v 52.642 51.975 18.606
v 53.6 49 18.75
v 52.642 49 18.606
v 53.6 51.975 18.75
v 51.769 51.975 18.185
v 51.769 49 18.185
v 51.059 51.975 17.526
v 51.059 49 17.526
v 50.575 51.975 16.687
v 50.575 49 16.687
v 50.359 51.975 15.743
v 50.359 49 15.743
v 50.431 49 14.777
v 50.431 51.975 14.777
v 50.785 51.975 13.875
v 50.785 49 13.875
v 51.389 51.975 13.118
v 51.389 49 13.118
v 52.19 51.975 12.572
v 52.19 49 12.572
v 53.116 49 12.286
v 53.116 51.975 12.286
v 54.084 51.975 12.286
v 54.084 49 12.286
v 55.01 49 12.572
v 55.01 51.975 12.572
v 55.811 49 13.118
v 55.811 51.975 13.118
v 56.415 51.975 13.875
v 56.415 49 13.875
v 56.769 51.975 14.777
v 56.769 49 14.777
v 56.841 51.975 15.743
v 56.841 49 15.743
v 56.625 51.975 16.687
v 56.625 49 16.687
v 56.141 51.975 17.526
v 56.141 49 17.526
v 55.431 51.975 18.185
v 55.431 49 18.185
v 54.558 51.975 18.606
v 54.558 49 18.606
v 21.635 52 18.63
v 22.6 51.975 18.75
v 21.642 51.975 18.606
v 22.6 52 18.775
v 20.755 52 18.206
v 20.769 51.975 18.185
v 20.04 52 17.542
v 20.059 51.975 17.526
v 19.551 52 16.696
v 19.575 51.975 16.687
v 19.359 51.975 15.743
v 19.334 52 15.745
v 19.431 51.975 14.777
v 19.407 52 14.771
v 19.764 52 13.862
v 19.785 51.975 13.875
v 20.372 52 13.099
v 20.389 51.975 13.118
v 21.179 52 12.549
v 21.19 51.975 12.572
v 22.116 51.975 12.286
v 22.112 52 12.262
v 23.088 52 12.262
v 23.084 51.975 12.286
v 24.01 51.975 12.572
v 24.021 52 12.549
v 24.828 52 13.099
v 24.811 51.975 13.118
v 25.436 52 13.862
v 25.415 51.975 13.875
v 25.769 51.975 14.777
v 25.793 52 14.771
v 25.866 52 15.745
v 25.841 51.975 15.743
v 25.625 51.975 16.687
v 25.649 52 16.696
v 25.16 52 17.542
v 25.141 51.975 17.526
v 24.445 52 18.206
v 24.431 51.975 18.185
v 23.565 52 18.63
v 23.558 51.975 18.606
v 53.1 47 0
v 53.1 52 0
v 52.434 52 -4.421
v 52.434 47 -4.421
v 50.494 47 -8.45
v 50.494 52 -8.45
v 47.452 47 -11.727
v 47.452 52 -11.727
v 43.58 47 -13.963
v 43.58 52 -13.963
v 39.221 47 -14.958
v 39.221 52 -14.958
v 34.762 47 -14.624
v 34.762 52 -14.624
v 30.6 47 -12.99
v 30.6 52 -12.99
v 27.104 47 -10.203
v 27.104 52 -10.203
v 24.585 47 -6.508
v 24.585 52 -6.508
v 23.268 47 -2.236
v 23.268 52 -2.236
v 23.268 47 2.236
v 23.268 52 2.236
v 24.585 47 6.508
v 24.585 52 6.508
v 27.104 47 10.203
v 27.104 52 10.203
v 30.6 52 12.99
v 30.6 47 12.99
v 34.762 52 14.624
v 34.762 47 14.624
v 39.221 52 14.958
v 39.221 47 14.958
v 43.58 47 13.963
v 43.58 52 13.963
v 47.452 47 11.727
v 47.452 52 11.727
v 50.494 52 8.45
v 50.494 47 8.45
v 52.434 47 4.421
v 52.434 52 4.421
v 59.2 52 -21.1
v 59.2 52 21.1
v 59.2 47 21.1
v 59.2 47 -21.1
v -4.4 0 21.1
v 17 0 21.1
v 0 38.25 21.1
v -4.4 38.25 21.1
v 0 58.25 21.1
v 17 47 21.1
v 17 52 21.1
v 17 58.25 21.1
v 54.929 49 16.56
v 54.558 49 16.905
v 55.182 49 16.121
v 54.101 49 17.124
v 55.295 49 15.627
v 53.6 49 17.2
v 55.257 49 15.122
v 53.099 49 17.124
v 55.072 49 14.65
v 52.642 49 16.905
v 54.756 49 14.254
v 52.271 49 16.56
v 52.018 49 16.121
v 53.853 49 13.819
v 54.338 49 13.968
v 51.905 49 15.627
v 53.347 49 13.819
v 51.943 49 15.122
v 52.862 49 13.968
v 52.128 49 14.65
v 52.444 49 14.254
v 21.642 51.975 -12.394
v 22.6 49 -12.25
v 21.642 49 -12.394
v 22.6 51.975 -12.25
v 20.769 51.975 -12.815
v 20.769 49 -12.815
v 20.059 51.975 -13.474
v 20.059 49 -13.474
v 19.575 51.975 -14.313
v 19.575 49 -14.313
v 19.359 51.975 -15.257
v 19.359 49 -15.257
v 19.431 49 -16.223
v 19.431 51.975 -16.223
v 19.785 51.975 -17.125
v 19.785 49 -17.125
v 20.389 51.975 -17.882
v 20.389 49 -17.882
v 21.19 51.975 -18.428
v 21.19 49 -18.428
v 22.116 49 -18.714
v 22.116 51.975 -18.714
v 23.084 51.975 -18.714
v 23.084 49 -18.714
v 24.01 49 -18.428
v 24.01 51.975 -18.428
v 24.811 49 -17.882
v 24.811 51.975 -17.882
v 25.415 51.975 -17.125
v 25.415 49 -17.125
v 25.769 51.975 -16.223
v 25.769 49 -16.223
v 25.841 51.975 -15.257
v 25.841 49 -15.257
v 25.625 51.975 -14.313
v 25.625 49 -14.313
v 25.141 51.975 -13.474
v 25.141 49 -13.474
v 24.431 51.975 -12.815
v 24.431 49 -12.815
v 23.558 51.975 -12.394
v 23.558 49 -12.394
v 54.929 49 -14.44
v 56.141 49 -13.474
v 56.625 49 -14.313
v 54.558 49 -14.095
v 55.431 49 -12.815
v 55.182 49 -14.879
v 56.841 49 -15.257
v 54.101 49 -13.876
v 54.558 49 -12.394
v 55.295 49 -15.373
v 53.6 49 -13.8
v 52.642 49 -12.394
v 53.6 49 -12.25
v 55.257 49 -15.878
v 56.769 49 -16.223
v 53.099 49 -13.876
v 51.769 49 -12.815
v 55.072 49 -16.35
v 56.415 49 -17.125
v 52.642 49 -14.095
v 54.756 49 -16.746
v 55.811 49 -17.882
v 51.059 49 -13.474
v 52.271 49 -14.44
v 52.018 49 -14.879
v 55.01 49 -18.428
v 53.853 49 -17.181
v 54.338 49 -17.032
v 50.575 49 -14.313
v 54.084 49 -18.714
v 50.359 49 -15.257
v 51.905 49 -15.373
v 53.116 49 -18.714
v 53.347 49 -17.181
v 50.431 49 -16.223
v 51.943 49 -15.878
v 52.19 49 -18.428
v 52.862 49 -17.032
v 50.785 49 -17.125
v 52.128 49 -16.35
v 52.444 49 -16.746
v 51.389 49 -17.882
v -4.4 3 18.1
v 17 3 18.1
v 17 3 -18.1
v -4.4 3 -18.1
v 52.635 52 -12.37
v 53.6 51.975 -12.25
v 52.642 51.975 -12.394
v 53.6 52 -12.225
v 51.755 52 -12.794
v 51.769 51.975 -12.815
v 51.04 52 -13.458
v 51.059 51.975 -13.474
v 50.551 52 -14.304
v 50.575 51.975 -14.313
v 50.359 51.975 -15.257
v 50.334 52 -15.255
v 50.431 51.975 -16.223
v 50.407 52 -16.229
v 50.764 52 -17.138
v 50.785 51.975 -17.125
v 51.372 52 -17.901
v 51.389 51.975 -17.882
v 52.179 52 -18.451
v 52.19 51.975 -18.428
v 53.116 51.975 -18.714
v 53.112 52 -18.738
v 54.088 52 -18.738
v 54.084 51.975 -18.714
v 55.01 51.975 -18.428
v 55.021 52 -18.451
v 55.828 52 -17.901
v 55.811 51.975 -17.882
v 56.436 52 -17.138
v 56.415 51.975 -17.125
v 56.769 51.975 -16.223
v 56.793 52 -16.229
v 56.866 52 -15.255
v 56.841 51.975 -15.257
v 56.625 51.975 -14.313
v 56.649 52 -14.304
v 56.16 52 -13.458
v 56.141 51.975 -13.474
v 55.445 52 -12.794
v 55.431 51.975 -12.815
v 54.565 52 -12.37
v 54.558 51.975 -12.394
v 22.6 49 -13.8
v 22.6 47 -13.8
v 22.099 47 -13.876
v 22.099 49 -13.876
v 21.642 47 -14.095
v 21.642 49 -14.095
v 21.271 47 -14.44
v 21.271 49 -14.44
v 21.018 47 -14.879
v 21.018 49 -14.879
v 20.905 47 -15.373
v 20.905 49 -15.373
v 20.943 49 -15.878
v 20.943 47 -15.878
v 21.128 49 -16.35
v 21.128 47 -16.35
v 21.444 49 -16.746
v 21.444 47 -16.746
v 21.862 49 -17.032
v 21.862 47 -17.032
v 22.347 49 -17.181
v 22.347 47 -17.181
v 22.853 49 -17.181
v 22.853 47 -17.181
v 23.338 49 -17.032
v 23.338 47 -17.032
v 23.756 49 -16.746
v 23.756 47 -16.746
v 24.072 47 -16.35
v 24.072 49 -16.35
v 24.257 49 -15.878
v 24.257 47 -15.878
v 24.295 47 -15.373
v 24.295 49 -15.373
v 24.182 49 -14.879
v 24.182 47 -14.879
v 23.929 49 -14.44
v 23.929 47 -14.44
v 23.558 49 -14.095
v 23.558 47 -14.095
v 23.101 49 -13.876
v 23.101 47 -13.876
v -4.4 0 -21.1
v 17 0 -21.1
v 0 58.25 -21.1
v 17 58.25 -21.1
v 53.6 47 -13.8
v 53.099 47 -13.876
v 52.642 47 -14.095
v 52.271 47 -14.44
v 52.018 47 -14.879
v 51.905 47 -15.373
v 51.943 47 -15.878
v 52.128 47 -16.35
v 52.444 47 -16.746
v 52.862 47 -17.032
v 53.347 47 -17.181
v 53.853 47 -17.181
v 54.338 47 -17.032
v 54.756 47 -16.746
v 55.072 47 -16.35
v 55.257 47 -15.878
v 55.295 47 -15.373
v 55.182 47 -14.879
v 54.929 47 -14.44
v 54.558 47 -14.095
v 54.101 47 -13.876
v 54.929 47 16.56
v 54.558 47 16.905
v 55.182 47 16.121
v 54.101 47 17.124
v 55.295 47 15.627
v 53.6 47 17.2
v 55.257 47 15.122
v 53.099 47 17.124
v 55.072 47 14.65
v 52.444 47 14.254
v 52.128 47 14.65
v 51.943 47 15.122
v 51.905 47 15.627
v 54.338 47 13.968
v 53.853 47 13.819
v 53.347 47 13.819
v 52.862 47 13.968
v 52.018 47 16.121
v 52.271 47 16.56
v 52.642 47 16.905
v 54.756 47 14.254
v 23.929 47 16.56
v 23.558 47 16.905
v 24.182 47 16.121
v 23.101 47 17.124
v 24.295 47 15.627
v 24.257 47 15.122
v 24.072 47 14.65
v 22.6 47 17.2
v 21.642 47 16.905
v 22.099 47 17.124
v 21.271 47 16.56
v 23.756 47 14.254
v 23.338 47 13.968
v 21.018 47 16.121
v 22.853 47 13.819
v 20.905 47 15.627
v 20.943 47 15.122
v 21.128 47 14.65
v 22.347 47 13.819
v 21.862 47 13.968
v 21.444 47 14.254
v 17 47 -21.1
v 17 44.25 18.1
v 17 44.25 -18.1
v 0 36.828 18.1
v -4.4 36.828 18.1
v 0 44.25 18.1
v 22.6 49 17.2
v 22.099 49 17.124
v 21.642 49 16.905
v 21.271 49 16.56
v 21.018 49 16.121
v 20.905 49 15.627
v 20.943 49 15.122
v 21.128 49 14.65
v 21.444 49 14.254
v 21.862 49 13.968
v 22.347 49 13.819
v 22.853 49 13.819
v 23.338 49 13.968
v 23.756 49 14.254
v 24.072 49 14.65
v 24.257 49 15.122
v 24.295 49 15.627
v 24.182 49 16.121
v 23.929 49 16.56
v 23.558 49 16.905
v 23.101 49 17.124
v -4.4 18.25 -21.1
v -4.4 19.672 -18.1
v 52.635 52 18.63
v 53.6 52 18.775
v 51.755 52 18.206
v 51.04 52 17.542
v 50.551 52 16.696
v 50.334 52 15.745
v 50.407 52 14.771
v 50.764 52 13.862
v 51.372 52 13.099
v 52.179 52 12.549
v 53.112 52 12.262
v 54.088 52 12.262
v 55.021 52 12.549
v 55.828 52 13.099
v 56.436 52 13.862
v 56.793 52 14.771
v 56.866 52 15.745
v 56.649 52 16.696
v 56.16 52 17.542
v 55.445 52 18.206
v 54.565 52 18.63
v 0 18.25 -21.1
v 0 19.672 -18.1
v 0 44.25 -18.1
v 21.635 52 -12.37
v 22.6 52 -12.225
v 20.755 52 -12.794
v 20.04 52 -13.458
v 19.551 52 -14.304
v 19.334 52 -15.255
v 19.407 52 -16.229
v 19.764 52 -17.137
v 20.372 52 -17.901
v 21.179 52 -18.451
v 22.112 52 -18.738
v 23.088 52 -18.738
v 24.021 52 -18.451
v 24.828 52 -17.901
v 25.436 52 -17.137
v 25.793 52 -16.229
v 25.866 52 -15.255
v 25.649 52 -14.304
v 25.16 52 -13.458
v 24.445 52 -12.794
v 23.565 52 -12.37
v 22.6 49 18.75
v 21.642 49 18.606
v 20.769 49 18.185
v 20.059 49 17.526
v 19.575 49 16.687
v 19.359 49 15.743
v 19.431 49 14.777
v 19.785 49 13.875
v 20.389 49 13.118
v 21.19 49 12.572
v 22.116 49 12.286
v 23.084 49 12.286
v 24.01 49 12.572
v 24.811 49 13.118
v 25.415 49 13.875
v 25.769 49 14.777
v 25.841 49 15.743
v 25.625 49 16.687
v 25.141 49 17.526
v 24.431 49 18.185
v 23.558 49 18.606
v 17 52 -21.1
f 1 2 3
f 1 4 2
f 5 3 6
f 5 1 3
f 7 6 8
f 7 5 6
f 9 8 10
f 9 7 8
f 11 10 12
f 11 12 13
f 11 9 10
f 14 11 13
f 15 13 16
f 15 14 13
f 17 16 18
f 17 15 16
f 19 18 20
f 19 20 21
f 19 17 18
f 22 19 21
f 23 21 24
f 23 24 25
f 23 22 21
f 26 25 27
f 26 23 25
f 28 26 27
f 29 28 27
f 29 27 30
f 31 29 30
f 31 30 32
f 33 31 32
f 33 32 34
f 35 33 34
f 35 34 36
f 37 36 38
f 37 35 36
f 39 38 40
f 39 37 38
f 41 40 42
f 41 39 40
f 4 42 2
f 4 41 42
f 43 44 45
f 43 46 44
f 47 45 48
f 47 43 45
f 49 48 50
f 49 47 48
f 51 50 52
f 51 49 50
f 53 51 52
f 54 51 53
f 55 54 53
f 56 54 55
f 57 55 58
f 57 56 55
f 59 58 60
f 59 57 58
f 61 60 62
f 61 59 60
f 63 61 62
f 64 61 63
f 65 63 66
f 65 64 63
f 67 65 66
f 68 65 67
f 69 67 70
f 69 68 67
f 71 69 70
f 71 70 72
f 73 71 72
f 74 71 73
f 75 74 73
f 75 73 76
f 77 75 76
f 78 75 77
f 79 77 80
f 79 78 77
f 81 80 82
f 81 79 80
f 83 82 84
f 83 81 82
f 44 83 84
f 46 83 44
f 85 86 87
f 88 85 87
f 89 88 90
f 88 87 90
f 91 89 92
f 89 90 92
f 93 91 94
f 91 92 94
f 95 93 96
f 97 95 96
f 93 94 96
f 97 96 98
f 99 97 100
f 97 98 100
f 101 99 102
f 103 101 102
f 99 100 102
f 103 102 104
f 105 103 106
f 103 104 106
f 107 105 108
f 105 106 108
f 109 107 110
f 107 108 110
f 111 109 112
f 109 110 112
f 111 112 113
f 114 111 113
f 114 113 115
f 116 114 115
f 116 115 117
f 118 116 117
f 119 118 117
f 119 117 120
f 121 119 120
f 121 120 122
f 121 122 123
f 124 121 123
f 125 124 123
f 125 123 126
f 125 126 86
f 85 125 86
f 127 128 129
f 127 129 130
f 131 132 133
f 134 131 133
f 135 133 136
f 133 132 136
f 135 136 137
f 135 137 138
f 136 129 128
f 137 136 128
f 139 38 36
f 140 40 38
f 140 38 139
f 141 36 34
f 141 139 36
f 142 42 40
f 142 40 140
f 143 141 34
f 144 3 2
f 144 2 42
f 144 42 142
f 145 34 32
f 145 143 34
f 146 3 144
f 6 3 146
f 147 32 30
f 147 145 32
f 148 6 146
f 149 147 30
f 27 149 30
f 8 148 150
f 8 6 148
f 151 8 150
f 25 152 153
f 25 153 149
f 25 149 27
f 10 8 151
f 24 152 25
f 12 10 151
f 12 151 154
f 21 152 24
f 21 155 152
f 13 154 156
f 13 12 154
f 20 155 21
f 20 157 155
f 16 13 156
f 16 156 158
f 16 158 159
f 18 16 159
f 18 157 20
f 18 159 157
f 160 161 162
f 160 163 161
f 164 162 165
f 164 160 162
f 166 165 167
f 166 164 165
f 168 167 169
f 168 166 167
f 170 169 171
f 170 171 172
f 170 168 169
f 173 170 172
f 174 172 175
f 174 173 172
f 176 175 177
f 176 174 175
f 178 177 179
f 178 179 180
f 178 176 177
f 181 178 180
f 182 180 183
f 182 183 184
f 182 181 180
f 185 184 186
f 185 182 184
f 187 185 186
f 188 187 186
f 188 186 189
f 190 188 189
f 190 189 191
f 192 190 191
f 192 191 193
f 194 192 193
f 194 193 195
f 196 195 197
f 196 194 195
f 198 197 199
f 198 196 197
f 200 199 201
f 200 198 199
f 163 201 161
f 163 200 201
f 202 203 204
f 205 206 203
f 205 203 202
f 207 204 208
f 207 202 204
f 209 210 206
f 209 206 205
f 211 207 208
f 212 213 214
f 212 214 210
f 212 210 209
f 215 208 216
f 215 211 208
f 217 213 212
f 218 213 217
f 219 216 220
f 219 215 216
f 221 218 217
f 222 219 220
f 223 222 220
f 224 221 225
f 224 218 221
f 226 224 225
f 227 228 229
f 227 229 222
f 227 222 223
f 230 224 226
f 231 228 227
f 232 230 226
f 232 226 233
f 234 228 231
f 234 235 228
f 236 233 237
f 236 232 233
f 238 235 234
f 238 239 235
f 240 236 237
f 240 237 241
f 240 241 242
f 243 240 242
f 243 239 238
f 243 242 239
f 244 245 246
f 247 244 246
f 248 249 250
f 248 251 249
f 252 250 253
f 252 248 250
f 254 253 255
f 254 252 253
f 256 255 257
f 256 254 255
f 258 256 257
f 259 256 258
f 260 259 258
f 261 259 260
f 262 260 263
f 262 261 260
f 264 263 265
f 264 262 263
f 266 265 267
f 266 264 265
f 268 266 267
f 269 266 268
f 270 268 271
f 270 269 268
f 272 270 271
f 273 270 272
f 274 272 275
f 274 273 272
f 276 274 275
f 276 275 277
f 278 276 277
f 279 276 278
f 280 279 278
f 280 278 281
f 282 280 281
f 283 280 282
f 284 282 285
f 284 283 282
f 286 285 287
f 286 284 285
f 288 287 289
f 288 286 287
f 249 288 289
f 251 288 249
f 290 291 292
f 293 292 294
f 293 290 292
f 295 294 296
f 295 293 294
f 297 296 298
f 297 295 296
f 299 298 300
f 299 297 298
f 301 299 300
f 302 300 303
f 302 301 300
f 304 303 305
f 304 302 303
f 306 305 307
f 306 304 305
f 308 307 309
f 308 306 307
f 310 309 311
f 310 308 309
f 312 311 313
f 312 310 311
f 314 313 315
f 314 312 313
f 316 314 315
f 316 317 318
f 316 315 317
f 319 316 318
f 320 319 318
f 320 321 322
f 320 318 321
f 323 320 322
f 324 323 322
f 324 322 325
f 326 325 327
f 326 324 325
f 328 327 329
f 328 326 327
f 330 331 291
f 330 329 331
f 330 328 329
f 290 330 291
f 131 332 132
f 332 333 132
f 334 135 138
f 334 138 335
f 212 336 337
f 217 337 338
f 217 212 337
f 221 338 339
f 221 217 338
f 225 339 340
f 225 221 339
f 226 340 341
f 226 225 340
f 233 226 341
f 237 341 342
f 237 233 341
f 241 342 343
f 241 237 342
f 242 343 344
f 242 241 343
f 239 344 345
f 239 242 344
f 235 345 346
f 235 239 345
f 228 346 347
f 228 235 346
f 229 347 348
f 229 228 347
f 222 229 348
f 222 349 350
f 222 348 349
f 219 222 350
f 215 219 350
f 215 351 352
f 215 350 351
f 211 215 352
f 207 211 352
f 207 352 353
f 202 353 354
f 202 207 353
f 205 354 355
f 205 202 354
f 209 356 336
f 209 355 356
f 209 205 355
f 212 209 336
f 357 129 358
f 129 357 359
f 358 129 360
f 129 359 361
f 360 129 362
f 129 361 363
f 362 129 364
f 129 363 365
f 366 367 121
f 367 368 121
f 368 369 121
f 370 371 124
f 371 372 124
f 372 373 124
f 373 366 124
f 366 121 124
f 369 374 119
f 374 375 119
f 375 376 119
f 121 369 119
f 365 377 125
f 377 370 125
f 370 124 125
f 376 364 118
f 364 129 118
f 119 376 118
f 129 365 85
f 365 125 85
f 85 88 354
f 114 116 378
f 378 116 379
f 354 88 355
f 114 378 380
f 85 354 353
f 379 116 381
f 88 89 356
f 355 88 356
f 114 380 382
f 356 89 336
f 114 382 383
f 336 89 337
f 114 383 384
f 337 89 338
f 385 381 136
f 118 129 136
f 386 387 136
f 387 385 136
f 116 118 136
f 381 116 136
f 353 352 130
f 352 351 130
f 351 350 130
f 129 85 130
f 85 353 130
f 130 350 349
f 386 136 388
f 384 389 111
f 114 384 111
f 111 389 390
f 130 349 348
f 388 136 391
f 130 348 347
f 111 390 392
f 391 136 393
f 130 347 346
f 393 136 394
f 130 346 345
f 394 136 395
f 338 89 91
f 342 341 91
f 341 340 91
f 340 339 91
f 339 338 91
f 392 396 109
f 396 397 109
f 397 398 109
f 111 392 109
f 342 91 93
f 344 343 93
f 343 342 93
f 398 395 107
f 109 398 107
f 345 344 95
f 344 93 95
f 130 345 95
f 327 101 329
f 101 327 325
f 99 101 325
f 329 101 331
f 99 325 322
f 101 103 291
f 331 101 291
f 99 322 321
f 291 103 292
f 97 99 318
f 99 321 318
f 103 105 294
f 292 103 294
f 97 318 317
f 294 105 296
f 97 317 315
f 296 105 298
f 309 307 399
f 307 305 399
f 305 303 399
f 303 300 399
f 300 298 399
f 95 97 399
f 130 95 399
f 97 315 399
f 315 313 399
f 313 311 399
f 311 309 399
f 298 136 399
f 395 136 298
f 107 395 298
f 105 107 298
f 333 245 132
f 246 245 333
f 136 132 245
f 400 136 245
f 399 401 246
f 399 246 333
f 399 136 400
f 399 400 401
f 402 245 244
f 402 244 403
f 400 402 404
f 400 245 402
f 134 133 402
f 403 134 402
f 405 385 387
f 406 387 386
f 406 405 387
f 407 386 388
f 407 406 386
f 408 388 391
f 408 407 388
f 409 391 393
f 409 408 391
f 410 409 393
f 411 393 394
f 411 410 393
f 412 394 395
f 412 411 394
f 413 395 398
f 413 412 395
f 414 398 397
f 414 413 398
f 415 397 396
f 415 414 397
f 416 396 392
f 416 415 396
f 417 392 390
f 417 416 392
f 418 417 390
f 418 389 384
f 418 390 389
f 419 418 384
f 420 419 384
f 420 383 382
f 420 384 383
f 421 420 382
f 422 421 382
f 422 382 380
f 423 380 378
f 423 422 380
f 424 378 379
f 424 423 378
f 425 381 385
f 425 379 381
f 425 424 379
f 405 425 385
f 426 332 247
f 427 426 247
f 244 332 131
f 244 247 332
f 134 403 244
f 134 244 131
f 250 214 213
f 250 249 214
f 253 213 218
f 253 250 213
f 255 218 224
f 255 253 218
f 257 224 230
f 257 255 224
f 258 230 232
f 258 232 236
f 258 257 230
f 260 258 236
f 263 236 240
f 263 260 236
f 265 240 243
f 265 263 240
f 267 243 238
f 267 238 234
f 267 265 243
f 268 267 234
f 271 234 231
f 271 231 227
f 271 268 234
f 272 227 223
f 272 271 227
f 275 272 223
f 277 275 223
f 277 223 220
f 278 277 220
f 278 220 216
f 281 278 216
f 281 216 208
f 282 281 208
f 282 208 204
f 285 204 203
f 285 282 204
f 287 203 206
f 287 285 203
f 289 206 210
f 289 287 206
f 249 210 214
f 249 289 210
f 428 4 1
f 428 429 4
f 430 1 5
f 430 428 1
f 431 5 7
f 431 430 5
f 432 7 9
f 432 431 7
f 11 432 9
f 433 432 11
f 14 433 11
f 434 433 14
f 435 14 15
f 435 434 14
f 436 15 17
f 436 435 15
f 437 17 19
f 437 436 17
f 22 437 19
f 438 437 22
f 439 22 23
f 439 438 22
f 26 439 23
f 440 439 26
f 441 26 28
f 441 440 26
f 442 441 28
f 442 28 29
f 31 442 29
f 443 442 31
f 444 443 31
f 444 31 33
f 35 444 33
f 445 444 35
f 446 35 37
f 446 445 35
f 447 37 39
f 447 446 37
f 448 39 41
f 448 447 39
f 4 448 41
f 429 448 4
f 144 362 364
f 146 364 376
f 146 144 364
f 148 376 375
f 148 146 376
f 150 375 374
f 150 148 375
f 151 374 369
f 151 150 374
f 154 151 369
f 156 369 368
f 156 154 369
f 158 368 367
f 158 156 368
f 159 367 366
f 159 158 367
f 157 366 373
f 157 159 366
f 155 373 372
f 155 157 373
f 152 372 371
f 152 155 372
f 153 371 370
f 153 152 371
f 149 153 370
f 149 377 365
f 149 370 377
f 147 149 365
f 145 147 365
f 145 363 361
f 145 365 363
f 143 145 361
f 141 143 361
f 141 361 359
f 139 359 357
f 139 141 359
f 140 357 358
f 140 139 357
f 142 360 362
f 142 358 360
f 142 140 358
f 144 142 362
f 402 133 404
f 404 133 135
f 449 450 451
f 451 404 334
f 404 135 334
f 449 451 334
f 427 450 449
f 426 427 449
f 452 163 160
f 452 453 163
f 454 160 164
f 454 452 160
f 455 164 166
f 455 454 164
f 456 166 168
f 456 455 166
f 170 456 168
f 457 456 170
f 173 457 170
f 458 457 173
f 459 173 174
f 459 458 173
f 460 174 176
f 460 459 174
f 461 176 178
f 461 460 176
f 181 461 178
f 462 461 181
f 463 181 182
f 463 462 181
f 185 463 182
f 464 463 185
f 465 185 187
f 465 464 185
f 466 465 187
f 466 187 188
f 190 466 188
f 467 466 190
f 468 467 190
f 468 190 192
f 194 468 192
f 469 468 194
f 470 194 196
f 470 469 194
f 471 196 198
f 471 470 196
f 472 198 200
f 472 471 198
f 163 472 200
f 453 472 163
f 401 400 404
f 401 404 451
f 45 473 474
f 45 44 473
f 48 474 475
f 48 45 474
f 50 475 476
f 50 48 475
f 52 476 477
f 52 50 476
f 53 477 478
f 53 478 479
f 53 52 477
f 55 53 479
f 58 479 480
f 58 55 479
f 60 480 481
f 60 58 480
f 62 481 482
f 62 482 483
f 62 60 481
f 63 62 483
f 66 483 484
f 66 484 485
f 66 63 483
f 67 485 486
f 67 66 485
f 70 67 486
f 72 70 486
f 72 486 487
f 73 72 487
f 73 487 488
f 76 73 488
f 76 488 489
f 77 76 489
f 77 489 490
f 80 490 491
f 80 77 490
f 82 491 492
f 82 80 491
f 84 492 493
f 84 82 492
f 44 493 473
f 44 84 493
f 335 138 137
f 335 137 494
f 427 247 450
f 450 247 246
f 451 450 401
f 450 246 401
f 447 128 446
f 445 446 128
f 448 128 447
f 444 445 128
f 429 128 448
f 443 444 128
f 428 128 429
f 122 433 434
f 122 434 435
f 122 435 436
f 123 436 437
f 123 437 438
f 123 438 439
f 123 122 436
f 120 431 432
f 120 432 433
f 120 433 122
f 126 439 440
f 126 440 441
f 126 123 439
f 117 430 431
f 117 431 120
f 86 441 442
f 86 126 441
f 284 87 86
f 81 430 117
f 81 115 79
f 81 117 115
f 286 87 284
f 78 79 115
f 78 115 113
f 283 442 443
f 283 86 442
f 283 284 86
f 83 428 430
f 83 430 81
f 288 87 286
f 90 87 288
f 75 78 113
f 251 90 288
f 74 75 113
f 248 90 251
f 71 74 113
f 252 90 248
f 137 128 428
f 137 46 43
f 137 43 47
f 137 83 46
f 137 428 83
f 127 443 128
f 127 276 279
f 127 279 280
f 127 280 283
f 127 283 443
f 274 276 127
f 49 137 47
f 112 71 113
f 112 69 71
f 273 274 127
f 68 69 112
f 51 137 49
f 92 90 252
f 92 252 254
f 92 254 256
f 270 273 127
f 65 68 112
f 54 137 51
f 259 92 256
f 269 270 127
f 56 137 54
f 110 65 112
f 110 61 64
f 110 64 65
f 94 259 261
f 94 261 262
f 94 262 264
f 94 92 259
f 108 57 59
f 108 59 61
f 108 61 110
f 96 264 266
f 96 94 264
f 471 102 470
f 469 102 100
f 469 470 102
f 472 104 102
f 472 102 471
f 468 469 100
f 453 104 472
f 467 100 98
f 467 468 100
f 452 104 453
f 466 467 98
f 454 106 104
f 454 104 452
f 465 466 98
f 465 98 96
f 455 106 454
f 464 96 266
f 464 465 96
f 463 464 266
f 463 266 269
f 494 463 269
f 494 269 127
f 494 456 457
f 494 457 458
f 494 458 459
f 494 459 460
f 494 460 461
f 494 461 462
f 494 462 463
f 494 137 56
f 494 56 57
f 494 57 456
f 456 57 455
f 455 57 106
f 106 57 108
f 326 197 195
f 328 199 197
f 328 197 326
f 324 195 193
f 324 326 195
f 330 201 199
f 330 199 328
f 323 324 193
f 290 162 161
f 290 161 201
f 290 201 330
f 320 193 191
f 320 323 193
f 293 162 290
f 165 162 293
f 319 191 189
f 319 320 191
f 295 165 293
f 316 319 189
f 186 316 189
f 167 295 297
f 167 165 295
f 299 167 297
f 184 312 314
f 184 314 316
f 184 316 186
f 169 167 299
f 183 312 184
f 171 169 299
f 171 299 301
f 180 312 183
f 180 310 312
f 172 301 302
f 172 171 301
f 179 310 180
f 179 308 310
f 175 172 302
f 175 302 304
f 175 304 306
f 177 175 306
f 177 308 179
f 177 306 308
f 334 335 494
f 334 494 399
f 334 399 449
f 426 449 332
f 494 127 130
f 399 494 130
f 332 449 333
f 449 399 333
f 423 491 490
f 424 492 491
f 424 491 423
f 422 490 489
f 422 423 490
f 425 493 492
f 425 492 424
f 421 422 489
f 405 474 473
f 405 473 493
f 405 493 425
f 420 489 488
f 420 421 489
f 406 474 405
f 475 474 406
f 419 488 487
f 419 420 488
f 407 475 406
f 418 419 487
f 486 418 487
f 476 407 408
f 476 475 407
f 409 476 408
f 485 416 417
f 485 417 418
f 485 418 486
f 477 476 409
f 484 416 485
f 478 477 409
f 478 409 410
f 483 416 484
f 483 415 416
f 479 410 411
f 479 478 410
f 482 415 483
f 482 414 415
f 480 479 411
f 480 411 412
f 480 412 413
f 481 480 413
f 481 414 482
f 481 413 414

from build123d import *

# Parameters (mm, degrees)
SKETCH1_W                     = 42.2
SKETCH1_H                     = 58.25
BOSS_EXTRUDE1_DEPTH           = 17
SKETCH2_W                     = 42.2
SKETCH2_H                     = 5
BOSS_EXTRUDE2_DEPTH           = 42.2
CBORE_FOR_M3_SHCS1_AT_2_COUNT = 2
CBORE_FOR_M3_SHCS1_AT_2_PITCH = 31
CBORE_FOR_M3_SHCS1_AT_3_COUNT = 2
CBORE_FOR_M3_SHCS1_AT_3_PITCH = 43.840620434
CBORE_FOR_M3_SHCS1_AT_4_COUNT = 2
CBORE_FOR_M3_SHCS1_AT_4_PITCH = 31
SKETCH5_R                     = 15
CUT_EXTRUDE1_DEPTH            = 53
BOSS_EXTRUDE3_DEPTH           = 4.4
SKETCH7_W                     = 36.2
SKETCH7_H                     = 41.25
CUT_EXTRUDE2_DEPTH            = 22.4


with BuildPart() as part:
    # Sketch1 → Boss-Extrude1 (new body)
    with BuildSketch(Plane(origin=(0, 0, 0), x_dir=(0, 0, -1), z_dir=(1, 0, 0))):
        with Locations((0, 29.125)):
            Rectangle(SKETCH1_W, SKETCH1_H)
    extrude(amount=BOSS_EXTRUDE1_DEPTH)

    # Sketch2 → Boss-Extrude2 (add)
    with BuildSketch(Plane(origin=(17, 0, 0), x_dir=(0, 0, -1), z_dir=(1, 0, 0))):
        with Locations((0, 49.5)):
            Rectangle(SKETCH2_W, SKETCH2_H)
    extrude(amount=BOSS_EXTRUDE2_DEPTH)

    # Sketch4 → CBORE for M3 SHCS1 (revolve, cut)
    with BuildSketch(Plane(origin=(53.6, 52, 15.5), x_dir=(0, 0, 1), z_dir=(1, 0, 0))):
        Polygon((0, 0), (0, 52), (1.7, 52), (1.7, 3), (3.25, 3), (3.25, 0.025), (3.275, 0), align=None)
    cbore_for_m3_shcs1 = revolve(axis=Axis((53.6, 58.35, 15.5), (0, -1, 0)), mode=Mode.SUBTRACT)

    # CBORE for M3 SHCS1 at 2: CBORE for M3 SHCS1 ×2
    with Locations(*[(0, 0, -i * CBORE_FOR_M3_SHCS1_AT_2_PITCH) for i in range(1, CBORE_FOR_M3_SHCS1_AT_2_COUNT)]):
        add(cbore_for_m3_shcs1, mode=Mode.SUBTRACT)

    # CBORE for M3 SHCS1 at 3: CBORE for M3 SHCS1 ×2
    with Locations(*[Vector(-0.707106781, 0, -0.707106781) * (i * CBORE_FOR_M3_SHCS1_AT_3_PITCH) for i in range(1, CBORE_FOR_M3_SHCS1_AT_3_COUNT)]):
        add(cbore_for_m3_shcs1, mode=Mode.SUBTRACT)

    # CBORE for M3 SHCS1 at 4: CBORE for M3 SHCS1 ×2
    with Locations(*[(-i * CBORE_FOR_M3_SHCS1_AT_4_PITCH, 0, 0) for i in range(1, CBORE_FOR_M3_SHCS1_AT_4_COUNT)]):
        add(cbore_for_m3_shcs1, mode=Mode.SUBTRACT)

    # Sketch5 → Cut-Extrude1 (cut, through all)
    with BuildSketch(Plane(origin=(0, 52, 0), x_dir=(1, 0, 0), z_dir=(0, 1, 0))):
        with Locations((38.1, 0)):
            Circle(SKETCH5_R)
    extrude(amount=-CUT_EXTRUDE1_DEPTH, mode=Mode.SUBTRACT)

    # Sketch6 → Boss-Extrude3 (add)
    with BuildSketch(Plane(origin=(0, 0, 0), x_dir=(0, 0, -1), z_dir=(1, 0, 0))):
        Polygon((-21.1, 38.25), (21.1, 18.25), (21.1, 0), (-21.1, 0), align=None)
    extrude(amount=-BOSS_EXTRUDE3_DEPTH)

    # Sketch7 → Cut-Extrude2 (cut, through all)
    with BuildSketch(Plane(origin=(17, 0, 0), x_dir=(0, 0, -1), z_dir=(1, 0, 0))):
        with Locations((0, 23.625)):
            Rectangle(SKETCH7_W, SKETCH7_H)
    extrude(amount=-CUT_EXTRUDE2_DEPTH, mode=Mode.SUBTRACT)


solid = part.part
